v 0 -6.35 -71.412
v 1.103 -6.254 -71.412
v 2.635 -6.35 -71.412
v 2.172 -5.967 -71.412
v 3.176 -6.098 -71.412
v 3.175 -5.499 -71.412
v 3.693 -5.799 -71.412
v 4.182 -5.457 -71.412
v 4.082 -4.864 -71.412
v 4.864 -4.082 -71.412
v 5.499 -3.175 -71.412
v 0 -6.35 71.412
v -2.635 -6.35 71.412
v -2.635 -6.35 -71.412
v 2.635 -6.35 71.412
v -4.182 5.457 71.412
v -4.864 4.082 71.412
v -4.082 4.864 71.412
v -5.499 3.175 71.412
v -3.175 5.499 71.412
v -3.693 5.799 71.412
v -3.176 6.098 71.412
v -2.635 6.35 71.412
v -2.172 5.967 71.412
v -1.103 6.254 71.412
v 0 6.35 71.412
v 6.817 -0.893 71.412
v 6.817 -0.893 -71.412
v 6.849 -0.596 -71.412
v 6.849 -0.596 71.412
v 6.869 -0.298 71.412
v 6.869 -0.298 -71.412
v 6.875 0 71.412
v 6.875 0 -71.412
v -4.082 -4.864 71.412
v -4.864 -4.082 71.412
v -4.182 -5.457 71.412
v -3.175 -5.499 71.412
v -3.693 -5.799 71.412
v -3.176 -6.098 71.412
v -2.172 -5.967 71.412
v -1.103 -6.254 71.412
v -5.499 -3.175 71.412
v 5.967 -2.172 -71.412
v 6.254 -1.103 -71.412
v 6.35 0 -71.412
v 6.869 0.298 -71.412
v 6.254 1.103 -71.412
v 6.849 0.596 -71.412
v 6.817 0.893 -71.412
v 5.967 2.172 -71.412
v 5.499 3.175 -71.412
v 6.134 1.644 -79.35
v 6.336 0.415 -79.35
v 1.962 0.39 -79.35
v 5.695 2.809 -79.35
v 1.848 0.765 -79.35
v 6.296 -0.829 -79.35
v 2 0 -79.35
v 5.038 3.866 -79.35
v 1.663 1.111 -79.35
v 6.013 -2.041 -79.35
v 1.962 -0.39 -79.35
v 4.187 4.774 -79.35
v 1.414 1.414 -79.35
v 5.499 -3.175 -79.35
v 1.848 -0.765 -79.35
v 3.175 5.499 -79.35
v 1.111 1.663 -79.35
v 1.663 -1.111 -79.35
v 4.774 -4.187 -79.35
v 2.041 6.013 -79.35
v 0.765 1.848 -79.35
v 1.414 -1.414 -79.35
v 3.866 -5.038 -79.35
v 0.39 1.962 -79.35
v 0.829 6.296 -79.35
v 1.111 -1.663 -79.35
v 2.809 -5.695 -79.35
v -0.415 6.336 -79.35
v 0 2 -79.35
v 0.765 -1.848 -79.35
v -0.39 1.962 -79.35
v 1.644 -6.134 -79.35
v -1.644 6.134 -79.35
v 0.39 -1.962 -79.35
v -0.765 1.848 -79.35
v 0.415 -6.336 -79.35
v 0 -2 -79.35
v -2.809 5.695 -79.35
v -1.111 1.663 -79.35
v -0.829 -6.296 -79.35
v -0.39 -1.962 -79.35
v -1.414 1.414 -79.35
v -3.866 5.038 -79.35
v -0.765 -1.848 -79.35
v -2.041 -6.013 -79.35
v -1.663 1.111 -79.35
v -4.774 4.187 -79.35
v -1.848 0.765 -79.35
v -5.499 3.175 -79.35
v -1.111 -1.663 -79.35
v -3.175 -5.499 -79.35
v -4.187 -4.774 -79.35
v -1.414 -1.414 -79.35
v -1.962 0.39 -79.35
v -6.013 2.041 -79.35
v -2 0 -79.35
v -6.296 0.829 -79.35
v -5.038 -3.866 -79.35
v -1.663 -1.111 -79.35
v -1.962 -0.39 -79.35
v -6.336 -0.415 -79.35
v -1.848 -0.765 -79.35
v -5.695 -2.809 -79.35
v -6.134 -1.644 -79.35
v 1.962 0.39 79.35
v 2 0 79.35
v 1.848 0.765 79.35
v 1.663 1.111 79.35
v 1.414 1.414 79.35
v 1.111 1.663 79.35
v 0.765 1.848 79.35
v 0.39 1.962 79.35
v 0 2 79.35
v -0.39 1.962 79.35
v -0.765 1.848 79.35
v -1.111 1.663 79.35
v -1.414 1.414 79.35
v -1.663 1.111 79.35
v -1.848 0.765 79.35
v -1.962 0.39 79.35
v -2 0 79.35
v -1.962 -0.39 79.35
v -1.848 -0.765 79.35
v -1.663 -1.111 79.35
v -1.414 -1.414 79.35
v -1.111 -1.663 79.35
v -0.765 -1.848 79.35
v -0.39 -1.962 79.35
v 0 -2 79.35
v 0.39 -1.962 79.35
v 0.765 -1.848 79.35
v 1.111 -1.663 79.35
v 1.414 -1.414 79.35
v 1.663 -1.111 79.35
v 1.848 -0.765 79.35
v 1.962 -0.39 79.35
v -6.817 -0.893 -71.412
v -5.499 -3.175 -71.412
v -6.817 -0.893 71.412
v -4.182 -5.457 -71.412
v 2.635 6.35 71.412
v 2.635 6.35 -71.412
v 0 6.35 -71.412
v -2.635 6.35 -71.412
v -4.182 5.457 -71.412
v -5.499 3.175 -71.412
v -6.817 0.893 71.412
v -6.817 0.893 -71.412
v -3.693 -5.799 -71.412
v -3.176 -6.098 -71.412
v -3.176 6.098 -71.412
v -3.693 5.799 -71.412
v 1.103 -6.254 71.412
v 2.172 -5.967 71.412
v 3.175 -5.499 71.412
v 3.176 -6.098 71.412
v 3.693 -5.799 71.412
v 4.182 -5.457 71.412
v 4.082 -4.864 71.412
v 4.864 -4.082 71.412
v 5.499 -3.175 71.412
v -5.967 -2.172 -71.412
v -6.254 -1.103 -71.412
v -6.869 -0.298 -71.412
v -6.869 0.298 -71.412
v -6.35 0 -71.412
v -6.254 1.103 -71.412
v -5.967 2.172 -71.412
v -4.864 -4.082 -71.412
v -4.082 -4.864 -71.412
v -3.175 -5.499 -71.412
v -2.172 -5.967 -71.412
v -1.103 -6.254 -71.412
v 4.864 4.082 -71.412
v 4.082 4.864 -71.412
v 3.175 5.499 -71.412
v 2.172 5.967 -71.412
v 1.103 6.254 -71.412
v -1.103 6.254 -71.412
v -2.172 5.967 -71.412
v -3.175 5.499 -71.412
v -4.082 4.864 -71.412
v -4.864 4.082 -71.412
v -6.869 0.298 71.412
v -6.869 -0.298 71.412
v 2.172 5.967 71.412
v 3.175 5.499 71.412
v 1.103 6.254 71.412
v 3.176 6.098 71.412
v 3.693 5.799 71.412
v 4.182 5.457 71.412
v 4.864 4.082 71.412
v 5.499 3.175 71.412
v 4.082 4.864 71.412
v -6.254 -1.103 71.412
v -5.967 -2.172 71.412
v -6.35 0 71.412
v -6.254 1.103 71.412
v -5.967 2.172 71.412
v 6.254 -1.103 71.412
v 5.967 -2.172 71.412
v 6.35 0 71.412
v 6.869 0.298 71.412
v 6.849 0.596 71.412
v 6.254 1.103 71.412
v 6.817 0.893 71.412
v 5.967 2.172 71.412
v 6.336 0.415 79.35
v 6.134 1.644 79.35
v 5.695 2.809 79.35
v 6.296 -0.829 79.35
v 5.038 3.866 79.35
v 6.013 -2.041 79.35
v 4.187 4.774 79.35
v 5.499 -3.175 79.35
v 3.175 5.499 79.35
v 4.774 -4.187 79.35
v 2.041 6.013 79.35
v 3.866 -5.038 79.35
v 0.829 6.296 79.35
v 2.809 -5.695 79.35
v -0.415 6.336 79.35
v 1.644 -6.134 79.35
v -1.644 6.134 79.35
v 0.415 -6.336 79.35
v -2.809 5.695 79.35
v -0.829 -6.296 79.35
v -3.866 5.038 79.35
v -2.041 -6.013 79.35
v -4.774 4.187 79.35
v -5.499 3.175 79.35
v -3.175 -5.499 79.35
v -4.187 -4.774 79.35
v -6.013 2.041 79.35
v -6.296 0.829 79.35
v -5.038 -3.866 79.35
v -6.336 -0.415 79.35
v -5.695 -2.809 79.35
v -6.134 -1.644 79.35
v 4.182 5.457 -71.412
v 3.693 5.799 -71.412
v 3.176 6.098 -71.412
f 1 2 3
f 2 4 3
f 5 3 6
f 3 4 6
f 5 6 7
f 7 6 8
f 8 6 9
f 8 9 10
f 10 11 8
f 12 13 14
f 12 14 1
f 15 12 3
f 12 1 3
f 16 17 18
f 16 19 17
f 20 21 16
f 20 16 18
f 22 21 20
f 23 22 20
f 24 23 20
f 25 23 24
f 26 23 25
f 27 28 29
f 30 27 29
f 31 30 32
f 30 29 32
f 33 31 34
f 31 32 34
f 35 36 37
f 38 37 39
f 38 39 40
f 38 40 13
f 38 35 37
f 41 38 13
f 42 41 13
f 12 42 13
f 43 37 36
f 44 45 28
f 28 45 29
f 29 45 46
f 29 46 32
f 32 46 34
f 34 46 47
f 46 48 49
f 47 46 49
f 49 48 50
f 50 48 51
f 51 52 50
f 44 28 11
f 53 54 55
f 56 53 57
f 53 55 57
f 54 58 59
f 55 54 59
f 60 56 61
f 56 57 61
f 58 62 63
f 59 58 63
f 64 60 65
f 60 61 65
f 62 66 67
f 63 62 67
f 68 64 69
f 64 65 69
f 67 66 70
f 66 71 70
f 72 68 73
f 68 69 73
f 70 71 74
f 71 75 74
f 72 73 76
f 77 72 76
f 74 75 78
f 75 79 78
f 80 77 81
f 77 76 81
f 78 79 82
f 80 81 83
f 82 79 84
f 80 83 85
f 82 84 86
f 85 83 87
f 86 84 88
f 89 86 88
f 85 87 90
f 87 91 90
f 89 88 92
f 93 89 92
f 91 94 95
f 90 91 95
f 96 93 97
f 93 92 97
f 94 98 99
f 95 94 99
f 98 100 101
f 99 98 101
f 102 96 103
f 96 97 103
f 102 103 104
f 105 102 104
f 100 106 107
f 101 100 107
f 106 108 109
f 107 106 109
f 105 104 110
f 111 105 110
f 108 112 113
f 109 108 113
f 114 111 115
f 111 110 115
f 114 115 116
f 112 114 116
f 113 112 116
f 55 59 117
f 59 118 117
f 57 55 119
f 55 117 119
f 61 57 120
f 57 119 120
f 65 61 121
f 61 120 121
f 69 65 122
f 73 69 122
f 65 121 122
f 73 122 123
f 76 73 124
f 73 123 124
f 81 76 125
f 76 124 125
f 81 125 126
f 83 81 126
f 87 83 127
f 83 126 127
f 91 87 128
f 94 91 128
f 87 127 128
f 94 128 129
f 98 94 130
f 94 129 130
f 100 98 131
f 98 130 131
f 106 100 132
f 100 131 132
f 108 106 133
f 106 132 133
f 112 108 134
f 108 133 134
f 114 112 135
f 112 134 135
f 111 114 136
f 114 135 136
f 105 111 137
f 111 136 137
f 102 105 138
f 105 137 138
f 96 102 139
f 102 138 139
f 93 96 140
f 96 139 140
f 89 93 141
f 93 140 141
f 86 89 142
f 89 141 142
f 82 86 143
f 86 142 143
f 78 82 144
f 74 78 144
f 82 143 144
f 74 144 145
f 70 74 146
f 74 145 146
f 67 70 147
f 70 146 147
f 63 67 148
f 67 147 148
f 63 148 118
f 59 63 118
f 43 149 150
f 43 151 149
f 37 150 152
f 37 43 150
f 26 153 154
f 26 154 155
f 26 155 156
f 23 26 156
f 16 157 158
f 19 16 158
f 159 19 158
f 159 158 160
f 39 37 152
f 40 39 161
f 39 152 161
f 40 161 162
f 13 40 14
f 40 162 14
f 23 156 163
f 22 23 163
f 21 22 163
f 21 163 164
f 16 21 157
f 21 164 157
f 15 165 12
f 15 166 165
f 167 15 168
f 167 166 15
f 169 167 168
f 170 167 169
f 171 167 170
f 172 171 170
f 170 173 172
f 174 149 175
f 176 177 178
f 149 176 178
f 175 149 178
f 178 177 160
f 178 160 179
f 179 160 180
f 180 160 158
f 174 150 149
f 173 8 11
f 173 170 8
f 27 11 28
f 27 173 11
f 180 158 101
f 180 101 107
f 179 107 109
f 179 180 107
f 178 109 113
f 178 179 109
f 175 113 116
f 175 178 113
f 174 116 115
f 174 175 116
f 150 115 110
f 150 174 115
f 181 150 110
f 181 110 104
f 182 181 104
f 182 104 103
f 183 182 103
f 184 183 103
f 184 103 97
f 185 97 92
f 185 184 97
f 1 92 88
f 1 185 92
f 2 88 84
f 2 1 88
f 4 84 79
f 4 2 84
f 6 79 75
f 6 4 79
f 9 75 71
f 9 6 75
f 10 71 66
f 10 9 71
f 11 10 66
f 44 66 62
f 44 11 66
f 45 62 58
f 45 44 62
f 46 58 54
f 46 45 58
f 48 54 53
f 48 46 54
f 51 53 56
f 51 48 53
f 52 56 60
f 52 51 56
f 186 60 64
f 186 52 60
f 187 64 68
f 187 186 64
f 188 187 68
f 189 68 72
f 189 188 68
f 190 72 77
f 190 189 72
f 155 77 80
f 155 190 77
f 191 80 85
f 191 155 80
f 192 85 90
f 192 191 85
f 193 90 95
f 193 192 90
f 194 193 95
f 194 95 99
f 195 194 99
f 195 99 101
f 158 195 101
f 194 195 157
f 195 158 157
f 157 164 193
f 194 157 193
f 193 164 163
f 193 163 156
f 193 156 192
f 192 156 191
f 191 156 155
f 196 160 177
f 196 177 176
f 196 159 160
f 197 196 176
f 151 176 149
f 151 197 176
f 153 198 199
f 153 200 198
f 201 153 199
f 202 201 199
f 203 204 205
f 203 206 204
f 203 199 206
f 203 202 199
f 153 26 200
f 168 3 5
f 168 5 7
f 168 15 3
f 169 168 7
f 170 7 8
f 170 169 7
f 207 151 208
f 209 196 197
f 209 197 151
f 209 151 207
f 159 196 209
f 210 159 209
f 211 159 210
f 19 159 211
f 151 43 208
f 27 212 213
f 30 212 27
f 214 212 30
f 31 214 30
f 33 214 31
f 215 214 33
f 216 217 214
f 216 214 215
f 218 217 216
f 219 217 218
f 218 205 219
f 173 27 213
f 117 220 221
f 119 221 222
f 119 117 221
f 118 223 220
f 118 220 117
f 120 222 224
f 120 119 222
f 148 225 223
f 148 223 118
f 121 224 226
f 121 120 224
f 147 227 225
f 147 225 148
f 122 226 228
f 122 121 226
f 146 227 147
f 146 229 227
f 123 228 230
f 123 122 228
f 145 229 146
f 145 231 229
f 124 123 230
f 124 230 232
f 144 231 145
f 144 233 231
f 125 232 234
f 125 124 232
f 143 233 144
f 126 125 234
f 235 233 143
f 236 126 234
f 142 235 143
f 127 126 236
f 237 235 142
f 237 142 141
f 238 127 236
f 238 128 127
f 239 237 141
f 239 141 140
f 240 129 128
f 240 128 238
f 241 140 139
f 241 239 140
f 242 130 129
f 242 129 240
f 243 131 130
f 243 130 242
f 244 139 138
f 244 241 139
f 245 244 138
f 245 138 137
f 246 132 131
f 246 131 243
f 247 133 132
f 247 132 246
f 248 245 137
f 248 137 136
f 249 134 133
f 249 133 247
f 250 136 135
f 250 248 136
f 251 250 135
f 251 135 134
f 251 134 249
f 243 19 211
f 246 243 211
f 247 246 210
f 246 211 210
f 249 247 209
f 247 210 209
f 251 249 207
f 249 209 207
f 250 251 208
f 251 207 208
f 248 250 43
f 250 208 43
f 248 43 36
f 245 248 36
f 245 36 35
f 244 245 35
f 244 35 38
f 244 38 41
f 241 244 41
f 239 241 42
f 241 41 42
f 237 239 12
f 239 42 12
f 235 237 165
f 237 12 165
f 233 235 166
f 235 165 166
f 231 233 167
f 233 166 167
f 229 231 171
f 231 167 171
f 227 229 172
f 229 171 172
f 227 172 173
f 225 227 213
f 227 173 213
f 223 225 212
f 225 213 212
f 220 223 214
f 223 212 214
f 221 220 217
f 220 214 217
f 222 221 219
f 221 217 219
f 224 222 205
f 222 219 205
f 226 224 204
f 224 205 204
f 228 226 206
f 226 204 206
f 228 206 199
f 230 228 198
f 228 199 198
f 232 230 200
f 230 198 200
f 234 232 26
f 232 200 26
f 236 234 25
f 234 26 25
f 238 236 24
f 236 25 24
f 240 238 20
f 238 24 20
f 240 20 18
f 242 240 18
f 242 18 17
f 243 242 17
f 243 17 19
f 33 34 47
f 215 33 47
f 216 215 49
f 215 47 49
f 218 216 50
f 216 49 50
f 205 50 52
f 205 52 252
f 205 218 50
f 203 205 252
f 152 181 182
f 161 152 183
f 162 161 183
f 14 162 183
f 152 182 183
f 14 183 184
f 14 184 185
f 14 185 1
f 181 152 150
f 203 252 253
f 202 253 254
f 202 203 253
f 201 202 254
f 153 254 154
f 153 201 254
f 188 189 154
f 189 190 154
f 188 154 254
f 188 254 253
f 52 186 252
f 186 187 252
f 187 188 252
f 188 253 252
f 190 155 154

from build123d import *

# Parameters (mm, degrees)
SKETCH1_R           = 2.000000064
BOSS_EXTRUDE1_DEPTH = 71.4121
SKETCH4_R           = 6.35
SKETCH4_R_2         = 2.000000064
BOSS_EXTRUDE2_DEPTH = 7.9375


with BuildPart() as part:
    # Sketch1 → Boss-Extrude1 (new, symmetric)
    with BuildSketch(Plane.XY):
        with BuildLine():
            ThreePointArc((4.181770846, 5.456960429), (3.437499983, 5.953924622), (2.634980936, 6.35))
            Line((2.634980936, 6.35), (-2.634980936, 6.35))
            ThreePointArc((-2.634980936, 6.35), (-3.437499983, 5.953924622), (-4.181770846, 5.456960429))
            Line((-4.181770846, 5.456960429), (-6.816751782, 0.893039571))
            ThreePointArc((-6.816751782, 0.893039571), (-6.874999966, 0), (-6.816751782, -0.893039571))
            Line((-6.816751782, -0.893039571), (-4.181770846, -5.456960429))
            ThreePointArc((-4.181770846, -5.456960429), (-3.437499983, -5.953924622), (-2.634980936, -6.35))
            Line((-2.634980936, -6.35), (2.634980936, -6.35))
            ThreePointArc((2.634980936, -6.35), (3.437499983, -5.953924622), (4.181770846, -5.456960429))
            Line((4.181770846, -5.456960429), (6.816751782, -0.893039571))
            ThreePointArc((6.816751782, -0.893039571), (6.860422465, -0.447468582), (6.874999966, 0))
            ThreePointArc((6.874999966, 0), (6.860422465, 0.447468582), (6.816751782, 0.893039571))
            Line((6.816751782, 0.893039571), (4.181770846, 5.456960429))
        make_face()
        Circle(SKETCH1_R, mode=Mode.SUBTRACT)
    extrude(amount=BOSS_EXTRUDE1_DEPTH, both=True)

    # Sketch4 → Boss-Extrude2 (add)
    with BuildSketch(Plane.XY.offset(71.4121)):
        with Locations(Location((0, 0, 0), (0, 0, 150))):
            Circle(SKETCH4_R)
        Circle(SKETCH4_R_2, mode=Mode.SUBTRACT)
    boss_extrude2 = extrude(amount=BOSS_EXTRUDE2_DEPTH)

    # Mirror1: Boss-Extrude2 across plane
    add(boss_extrude2.mirror(Plane.XY))


solid = part.part
